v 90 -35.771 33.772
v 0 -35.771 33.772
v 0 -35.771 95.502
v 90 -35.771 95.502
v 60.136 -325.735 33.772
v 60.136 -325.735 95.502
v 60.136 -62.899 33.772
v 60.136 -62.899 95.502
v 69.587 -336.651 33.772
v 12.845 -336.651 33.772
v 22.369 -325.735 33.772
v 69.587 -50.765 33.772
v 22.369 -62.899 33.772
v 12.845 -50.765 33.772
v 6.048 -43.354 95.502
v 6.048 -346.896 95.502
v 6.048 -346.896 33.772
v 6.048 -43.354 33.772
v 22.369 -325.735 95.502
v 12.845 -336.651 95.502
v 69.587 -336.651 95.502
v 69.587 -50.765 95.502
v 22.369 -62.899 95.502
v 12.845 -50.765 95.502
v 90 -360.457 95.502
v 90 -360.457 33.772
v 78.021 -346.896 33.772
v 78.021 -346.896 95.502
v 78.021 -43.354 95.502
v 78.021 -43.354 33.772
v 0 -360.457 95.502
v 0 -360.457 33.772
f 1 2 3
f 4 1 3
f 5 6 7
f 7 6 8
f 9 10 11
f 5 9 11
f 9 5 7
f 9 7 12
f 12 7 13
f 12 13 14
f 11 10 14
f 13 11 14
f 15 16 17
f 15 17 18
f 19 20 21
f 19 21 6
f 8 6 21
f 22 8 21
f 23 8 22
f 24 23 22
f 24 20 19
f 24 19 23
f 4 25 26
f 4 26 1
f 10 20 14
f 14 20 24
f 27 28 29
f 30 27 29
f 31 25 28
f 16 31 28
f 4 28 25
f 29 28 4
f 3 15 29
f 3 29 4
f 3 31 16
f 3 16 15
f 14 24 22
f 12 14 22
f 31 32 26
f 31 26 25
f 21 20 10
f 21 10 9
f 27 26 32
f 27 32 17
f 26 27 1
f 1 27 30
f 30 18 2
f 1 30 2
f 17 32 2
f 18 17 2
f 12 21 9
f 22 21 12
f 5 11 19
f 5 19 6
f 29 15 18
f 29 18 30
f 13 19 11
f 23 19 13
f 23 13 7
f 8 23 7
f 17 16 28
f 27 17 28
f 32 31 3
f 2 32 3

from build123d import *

# Parameters (mm, degrees)
F0_W     = 324.6865719557
F0_H     = 61.7302879691
F1_DEPTH = 90
F3_W     = 71.9730192795
F3_H     = 303.5411946476
F3_W_2   = 56.7419305444
F3_H_2   = 285.8860269189
F3_W_3   = 37.7663187683
F3_H_3   = 262.8358900547
F4_DEPTH = 61.7312879691


# Not quite as in the source:
# - the program builds the solid bodies; features that only make, move or delete a surface that nothing else refers to are left out


with BuildPart() as f1:
    # F0 (on Right) → F1 (new body)
    with BuildSketch(Plane.YZ):
        with Locations((-198.1138437986, 64.6366849542)):
            Rectangle(F0_W, F0_H)
    extrude(amount=F1_DEPTH)

    # F3 (on face) → F4 (cut, through all)
    with BuildSketch(Plane.XY.offset(95.5018289387)):
        with Locations((42.0340183191, -195.1250378042)):
            Rectangle(F3_W, F3_H)
        with Locations((41.2159748375, -193.7081329525)):
            Rectangle(F3_W_2, F3_H_2, mode=Mode.SUBTRACT)
        with Locations((41.2525031716, -194.3167597055)):
            Rectangle(F3_W_3, F3_H_3)
    extrude(amount=-F4_DEPTH, mode=Mode.SUBTRACT)


solid = f1.part
